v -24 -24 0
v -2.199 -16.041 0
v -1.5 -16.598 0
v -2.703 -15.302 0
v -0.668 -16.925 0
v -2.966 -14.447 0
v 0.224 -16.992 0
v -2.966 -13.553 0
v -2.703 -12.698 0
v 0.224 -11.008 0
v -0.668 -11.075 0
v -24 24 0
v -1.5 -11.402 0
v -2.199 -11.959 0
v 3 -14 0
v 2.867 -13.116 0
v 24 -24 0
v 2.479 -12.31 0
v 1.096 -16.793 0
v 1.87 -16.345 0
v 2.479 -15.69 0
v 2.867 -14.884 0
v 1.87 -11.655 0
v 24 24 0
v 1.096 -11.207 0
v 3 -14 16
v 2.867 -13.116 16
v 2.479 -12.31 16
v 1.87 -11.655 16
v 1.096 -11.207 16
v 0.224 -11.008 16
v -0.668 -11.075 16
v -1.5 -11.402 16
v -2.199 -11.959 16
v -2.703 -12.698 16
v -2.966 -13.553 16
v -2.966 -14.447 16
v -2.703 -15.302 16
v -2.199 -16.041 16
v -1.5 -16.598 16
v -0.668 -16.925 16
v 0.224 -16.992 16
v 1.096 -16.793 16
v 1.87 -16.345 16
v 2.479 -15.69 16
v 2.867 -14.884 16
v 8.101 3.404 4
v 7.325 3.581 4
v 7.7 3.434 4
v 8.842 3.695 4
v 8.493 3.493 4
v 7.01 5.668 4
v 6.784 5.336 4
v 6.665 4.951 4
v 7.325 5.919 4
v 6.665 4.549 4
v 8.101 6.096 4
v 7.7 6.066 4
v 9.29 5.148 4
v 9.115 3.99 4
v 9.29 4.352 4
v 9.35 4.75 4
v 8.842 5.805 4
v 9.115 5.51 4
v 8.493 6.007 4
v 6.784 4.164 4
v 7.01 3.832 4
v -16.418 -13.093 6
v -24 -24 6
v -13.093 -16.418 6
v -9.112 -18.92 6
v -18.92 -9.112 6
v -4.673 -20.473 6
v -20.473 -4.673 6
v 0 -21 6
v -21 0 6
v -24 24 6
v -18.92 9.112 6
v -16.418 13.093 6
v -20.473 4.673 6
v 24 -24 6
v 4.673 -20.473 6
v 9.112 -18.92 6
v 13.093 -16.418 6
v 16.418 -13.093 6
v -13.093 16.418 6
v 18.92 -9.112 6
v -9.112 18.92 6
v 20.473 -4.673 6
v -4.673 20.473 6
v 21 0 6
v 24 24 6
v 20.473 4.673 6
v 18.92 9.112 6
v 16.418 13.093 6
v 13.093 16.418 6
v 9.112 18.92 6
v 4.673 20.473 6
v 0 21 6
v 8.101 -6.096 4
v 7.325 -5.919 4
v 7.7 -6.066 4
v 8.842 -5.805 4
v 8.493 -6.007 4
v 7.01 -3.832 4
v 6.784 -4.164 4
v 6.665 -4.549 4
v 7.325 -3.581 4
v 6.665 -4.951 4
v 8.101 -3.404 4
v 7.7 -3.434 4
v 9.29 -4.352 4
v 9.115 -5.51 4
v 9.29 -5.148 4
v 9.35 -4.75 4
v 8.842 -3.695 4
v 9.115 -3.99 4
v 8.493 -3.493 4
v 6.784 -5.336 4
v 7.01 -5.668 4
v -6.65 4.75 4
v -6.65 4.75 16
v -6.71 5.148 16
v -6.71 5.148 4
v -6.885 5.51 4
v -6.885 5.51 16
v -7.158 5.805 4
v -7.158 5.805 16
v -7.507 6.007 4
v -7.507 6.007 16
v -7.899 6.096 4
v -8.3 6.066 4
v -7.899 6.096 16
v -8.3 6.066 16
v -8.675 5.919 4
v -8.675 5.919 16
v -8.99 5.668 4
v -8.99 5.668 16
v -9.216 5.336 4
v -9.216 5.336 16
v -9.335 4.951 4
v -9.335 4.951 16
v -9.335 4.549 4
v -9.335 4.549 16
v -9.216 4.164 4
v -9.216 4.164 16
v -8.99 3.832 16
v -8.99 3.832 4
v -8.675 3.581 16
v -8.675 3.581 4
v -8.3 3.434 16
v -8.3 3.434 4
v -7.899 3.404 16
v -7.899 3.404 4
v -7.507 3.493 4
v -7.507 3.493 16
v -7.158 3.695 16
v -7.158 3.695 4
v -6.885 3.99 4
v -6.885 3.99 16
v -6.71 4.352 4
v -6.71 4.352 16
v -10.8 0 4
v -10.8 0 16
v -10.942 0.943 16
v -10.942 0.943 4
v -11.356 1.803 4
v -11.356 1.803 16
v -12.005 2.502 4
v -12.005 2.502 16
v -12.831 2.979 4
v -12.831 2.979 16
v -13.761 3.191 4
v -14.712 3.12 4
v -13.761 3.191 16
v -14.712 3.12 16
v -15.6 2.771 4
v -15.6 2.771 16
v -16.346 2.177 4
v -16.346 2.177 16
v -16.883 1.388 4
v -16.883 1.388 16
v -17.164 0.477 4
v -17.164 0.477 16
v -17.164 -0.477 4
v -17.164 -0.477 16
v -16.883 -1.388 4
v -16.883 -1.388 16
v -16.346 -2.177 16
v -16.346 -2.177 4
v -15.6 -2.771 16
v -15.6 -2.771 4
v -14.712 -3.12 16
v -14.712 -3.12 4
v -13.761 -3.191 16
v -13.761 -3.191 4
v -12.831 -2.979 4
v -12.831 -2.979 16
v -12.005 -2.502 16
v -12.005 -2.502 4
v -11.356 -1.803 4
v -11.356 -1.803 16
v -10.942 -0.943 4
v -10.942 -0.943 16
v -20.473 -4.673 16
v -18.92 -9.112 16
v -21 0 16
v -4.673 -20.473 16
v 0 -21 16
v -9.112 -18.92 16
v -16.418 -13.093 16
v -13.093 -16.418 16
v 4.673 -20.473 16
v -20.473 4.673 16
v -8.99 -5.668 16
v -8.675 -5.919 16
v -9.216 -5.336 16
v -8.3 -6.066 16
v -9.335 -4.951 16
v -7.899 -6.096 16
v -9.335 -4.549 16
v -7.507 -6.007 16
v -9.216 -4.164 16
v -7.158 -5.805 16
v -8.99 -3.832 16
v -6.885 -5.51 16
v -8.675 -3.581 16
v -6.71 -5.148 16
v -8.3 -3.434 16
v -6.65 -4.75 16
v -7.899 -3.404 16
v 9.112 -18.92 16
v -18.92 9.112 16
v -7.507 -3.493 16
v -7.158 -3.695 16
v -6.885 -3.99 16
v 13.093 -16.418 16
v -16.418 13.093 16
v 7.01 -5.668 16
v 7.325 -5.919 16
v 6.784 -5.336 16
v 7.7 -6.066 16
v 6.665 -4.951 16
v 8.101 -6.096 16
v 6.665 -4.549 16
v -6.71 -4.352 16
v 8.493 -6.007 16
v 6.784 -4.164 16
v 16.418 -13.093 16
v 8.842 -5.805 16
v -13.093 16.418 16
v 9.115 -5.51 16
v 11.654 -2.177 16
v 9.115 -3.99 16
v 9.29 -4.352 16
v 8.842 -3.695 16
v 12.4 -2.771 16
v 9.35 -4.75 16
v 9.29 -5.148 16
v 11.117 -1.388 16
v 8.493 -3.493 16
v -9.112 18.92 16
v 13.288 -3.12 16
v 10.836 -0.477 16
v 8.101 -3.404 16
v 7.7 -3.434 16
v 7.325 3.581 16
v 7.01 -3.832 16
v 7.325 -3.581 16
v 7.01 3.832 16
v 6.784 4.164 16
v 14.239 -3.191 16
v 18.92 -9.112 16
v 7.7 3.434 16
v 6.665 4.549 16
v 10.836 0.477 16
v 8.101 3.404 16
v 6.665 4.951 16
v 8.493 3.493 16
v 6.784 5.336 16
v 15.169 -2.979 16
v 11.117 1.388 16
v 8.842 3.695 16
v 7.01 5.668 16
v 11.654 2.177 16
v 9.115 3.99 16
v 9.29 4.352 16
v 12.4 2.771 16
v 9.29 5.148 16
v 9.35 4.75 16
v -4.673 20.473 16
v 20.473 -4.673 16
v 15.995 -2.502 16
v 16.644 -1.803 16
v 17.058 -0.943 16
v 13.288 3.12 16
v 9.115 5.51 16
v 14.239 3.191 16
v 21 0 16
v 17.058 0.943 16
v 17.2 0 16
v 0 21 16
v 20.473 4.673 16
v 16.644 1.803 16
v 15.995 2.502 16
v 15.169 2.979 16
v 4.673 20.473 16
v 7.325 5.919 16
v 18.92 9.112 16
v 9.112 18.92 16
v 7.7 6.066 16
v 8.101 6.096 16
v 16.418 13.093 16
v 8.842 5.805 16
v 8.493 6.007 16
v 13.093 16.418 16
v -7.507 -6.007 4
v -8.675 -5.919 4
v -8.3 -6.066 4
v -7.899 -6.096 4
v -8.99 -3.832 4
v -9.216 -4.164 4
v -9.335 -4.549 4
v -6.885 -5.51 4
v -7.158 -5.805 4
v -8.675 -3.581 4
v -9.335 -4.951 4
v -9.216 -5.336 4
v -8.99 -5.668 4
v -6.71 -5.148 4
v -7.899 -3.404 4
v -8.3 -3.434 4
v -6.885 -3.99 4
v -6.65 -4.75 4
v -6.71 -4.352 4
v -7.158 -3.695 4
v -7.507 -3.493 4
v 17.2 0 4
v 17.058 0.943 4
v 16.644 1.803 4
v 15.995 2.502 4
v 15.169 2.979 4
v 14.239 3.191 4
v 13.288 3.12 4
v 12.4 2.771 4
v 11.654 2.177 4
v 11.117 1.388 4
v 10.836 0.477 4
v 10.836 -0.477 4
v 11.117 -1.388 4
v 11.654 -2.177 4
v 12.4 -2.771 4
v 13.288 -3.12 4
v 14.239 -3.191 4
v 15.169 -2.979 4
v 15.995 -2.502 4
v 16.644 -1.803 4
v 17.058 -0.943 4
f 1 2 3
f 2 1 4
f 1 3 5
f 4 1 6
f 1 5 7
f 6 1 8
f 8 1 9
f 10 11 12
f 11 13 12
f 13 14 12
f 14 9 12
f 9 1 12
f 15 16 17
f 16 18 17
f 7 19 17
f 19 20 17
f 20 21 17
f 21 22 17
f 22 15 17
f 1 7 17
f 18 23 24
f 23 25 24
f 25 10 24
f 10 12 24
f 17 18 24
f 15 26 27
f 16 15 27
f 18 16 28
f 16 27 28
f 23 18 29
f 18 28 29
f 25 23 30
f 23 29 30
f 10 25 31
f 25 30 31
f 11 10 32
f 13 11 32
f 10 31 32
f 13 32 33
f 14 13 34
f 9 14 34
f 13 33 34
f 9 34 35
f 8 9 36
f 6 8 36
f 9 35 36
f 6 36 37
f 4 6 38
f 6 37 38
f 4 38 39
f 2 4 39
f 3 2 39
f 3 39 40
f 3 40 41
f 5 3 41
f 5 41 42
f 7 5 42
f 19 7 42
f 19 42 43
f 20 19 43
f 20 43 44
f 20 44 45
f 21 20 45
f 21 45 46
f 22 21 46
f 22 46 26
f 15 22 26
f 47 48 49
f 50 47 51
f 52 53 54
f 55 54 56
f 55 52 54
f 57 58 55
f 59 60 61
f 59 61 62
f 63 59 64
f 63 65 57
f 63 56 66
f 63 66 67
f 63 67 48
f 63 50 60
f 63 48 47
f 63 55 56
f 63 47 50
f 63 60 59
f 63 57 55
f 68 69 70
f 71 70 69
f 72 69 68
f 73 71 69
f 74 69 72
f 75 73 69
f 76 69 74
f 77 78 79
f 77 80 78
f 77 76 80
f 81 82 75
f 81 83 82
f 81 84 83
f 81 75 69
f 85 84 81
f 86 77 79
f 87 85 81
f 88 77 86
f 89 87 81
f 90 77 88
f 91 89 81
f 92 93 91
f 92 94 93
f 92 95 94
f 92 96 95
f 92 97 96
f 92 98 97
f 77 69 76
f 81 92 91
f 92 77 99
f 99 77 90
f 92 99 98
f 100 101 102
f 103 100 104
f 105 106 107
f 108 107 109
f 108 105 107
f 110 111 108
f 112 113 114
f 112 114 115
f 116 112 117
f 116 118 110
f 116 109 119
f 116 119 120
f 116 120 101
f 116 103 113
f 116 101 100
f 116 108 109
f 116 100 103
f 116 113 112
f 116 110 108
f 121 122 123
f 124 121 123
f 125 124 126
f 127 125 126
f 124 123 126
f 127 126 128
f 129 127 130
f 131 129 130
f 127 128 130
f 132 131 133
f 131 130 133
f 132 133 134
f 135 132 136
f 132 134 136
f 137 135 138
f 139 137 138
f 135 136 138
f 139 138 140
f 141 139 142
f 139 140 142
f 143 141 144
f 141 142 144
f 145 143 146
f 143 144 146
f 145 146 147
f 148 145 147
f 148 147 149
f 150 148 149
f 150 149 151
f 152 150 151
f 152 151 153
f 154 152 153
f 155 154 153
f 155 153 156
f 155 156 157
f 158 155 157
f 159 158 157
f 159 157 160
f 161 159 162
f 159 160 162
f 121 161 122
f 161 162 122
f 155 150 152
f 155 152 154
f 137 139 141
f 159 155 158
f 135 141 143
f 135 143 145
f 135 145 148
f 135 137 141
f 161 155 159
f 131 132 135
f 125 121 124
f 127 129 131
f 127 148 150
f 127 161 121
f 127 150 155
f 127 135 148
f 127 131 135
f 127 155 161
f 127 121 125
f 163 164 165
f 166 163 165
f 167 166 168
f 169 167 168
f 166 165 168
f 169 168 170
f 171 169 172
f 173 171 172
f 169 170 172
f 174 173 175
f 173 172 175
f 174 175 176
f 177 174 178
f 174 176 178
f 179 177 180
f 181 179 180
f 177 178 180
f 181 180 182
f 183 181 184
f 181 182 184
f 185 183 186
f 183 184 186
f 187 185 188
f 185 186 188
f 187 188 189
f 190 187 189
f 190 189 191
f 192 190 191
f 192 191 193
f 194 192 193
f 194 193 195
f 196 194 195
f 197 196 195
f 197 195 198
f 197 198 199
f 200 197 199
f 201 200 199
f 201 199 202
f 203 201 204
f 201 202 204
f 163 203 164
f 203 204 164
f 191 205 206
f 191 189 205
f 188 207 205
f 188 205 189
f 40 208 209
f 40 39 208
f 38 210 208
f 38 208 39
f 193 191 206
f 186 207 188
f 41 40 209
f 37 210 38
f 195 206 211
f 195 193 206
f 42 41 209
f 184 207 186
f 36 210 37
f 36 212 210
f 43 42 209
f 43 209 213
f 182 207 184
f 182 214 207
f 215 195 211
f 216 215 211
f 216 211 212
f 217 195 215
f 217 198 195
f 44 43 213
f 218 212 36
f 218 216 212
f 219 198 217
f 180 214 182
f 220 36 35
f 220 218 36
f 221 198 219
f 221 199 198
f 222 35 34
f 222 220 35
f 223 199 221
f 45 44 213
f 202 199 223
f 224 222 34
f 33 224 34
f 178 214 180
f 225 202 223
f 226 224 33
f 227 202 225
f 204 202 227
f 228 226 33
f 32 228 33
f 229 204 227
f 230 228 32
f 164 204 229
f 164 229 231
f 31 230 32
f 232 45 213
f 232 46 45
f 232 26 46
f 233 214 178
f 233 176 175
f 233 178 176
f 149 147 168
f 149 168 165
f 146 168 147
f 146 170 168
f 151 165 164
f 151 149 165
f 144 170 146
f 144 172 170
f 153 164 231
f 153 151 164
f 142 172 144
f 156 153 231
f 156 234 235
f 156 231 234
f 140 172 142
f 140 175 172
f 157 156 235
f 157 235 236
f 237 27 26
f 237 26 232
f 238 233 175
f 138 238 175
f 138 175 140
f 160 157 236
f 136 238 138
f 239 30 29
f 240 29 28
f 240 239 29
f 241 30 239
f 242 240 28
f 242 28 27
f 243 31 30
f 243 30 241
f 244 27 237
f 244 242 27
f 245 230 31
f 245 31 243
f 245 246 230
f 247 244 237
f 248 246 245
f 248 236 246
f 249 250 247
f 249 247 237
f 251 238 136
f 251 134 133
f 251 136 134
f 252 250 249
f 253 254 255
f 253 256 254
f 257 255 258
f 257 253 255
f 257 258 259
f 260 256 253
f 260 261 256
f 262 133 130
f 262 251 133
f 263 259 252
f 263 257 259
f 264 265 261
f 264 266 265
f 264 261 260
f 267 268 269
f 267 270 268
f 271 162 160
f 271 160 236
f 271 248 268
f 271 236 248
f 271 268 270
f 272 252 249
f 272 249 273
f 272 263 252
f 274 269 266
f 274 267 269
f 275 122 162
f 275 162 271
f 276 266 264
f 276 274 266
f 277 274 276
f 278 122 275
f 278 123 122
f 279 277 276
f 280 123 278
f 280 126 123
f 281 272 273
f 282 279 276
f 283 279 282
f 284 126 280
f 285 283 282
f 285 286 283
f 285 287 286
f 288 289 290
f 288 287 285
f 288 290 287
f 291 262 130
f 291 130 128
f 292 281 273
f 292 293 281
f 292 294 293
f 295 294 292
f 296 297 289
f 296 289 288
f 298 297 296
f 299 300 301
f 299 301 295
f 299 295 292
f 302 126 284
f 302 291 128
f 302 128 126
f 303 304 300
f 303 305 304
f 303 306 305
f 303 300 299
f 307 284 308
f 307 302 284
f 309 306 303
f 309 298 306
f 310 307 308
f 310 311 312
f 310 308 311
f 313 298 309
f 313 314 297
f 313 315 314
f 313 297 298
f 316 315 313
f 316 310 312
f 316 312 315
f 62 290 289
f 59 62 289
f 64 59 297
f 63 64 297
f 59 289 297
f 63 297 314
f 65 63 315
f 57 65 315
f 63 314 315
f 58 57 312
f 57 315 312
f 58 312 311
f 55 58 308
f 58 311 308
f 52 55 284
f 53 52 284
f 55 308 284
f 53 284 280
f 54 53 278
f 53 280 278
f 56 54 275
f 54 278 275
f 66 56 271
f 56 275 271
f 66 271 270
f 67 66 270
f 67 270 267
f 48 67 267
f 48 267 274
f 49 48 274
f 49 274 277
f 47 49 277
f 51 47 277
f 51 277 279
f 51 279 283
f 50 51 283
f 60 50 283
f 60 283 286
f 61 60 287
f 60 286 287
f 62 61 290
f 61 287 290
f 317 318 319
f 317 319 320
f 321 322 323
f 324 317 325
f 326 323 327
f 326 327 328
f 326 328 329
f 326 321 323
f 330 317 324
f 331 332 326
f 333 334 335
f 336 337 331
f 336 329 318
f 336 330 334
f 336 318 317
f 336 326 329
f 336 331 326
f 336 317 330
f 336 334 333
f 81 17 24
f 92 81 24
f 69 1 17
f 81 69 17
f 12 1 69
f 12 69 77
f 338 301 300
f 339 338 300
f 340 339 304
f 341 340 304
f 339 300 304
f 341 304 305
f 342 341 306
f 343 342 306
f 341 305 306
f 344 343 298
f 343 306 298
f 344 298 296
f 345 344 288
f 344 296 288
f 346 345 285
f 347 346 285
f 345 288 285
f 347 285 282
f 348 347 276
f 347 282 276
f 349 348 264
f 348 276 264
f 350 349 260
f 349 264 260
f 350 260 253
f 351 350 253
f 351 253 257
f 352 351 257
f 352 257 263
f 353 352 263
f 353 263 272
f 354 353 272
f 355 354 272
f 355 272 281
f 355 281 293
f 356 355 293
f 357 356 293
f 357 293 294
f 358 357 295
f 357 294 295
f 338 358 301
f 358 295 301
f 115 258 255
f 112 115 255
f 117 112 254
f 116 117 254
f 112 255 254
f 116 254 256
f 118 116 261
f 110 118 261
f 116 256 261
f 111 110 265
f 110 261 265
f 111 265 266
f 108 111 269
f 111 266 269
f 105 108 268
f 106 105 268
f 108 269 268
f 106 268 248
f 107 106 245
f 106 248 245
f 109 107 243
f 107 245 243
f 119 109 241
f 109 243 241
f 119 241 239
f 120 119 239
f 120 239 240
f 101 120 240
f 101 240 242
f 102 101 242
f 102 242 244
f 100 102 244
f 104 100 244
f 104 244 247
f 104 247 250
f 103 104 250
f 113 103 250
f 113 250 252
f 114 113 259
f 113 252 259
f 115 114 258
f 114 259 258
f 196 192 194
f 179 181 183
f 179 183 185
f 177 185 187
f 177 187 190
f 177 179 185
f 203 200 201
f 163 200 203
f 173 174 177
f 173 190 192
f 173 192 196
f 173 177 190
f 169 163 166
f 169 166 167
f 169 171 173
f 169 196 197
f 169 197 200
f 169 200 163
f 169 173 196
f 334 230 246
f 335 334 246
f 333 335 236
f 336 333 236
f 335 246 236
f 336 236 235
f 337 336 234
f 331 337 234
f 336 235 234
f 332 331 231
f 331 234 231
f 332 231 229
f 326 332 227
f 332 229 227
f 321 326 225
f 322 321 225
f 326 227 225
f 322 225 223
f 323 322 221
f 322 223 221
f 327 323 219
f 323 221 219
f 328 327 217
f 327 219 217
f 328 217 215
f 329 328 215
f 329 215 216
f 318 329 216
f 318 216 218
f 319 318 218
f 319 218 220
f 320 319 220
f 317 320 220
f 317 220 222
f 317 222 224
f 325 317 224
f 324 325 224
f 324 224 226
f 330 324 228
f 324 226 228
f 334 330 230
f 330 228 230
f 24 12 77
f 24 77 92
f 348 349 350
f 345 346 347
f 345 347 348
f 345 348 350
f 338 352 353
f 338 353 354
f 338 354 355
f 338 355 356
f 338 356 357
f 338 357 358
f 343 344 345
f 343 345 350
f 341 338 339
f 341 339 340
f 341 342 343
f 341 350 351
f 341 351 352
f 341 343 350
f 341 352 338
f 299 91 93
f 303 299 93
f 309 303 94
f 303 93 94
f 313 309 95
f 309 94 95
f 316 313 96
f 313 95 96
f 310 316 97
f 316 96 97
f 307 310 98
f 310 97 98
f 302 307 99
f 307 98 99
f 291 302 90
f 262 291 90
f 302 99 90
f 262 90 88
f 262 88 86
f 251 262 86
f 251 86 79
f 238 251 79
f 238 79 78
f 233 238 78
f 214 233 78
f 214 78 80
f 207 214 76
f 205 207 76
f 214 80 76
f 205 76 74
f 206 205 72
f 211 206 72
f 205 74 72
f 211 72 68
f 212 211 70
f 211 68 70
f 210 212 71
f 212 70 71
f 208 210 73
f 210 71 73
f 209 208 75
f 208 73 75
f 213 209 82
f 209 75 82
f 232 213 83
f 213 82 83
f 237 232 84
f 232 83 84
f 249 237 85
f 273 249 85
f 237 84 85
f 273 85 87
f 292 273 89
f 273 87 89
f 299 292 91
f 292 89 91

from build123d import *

# Parameters (mm, degrees)
F0_W     = 48
F0_H     = 48
F1_DEPTH = 6
F2_R     = 21
F3_DEPTH = 10
F4_R     = 3.2
F4_R_2   = 1.35
F5_DEPTH = 12
F6_R     = 3
F7_DEPTH = 16.001


with BuildPart() as f1:
    # F0 (on Top) → F1 (new body)
    with BuildSketch(Plane.XY):
        Rectangle(F0_W, F0_H)
    extrude(amount=F1_DEPTH)

    # F2 (on face) → F3 (join)
    with BuildSketch(Plane.XY.offset(6)):
        Circle(F2_R)
    extrude(amount=F3_DEPTH)

    # F4 (on face) → F5 (cut)
    with BuildSketch(Plane.XY.offset(16)):
        with Locations((-14, 0)):
            Circle(F4_R)
        with Locations((14, 0)):
            Circle(F4_R)
        with Locations((-8, 4.75)):
            Circle(F4_R_2)
        with Locations((8, 4.75)):
            Circle(F4_R_2)
        with Locations((-8, -4.75)):
            Circle(F4_R_2)
        with Locations((8, -4.75)):
            Circle(F4_R_2)
    extrude(amount=-F5_DEPTH, mode=Mode.SUBTRACT)

    # F6 (on face) → F7 (cut, through all)
    with BuildSketch(Plane.XY.offset(16)):
        with Locations((0, -14)):
            Circle(F6_R)
    extrude(amount=-F7_DEPTH, mode=Mode.SUBTRACT)


solid = f1.part
